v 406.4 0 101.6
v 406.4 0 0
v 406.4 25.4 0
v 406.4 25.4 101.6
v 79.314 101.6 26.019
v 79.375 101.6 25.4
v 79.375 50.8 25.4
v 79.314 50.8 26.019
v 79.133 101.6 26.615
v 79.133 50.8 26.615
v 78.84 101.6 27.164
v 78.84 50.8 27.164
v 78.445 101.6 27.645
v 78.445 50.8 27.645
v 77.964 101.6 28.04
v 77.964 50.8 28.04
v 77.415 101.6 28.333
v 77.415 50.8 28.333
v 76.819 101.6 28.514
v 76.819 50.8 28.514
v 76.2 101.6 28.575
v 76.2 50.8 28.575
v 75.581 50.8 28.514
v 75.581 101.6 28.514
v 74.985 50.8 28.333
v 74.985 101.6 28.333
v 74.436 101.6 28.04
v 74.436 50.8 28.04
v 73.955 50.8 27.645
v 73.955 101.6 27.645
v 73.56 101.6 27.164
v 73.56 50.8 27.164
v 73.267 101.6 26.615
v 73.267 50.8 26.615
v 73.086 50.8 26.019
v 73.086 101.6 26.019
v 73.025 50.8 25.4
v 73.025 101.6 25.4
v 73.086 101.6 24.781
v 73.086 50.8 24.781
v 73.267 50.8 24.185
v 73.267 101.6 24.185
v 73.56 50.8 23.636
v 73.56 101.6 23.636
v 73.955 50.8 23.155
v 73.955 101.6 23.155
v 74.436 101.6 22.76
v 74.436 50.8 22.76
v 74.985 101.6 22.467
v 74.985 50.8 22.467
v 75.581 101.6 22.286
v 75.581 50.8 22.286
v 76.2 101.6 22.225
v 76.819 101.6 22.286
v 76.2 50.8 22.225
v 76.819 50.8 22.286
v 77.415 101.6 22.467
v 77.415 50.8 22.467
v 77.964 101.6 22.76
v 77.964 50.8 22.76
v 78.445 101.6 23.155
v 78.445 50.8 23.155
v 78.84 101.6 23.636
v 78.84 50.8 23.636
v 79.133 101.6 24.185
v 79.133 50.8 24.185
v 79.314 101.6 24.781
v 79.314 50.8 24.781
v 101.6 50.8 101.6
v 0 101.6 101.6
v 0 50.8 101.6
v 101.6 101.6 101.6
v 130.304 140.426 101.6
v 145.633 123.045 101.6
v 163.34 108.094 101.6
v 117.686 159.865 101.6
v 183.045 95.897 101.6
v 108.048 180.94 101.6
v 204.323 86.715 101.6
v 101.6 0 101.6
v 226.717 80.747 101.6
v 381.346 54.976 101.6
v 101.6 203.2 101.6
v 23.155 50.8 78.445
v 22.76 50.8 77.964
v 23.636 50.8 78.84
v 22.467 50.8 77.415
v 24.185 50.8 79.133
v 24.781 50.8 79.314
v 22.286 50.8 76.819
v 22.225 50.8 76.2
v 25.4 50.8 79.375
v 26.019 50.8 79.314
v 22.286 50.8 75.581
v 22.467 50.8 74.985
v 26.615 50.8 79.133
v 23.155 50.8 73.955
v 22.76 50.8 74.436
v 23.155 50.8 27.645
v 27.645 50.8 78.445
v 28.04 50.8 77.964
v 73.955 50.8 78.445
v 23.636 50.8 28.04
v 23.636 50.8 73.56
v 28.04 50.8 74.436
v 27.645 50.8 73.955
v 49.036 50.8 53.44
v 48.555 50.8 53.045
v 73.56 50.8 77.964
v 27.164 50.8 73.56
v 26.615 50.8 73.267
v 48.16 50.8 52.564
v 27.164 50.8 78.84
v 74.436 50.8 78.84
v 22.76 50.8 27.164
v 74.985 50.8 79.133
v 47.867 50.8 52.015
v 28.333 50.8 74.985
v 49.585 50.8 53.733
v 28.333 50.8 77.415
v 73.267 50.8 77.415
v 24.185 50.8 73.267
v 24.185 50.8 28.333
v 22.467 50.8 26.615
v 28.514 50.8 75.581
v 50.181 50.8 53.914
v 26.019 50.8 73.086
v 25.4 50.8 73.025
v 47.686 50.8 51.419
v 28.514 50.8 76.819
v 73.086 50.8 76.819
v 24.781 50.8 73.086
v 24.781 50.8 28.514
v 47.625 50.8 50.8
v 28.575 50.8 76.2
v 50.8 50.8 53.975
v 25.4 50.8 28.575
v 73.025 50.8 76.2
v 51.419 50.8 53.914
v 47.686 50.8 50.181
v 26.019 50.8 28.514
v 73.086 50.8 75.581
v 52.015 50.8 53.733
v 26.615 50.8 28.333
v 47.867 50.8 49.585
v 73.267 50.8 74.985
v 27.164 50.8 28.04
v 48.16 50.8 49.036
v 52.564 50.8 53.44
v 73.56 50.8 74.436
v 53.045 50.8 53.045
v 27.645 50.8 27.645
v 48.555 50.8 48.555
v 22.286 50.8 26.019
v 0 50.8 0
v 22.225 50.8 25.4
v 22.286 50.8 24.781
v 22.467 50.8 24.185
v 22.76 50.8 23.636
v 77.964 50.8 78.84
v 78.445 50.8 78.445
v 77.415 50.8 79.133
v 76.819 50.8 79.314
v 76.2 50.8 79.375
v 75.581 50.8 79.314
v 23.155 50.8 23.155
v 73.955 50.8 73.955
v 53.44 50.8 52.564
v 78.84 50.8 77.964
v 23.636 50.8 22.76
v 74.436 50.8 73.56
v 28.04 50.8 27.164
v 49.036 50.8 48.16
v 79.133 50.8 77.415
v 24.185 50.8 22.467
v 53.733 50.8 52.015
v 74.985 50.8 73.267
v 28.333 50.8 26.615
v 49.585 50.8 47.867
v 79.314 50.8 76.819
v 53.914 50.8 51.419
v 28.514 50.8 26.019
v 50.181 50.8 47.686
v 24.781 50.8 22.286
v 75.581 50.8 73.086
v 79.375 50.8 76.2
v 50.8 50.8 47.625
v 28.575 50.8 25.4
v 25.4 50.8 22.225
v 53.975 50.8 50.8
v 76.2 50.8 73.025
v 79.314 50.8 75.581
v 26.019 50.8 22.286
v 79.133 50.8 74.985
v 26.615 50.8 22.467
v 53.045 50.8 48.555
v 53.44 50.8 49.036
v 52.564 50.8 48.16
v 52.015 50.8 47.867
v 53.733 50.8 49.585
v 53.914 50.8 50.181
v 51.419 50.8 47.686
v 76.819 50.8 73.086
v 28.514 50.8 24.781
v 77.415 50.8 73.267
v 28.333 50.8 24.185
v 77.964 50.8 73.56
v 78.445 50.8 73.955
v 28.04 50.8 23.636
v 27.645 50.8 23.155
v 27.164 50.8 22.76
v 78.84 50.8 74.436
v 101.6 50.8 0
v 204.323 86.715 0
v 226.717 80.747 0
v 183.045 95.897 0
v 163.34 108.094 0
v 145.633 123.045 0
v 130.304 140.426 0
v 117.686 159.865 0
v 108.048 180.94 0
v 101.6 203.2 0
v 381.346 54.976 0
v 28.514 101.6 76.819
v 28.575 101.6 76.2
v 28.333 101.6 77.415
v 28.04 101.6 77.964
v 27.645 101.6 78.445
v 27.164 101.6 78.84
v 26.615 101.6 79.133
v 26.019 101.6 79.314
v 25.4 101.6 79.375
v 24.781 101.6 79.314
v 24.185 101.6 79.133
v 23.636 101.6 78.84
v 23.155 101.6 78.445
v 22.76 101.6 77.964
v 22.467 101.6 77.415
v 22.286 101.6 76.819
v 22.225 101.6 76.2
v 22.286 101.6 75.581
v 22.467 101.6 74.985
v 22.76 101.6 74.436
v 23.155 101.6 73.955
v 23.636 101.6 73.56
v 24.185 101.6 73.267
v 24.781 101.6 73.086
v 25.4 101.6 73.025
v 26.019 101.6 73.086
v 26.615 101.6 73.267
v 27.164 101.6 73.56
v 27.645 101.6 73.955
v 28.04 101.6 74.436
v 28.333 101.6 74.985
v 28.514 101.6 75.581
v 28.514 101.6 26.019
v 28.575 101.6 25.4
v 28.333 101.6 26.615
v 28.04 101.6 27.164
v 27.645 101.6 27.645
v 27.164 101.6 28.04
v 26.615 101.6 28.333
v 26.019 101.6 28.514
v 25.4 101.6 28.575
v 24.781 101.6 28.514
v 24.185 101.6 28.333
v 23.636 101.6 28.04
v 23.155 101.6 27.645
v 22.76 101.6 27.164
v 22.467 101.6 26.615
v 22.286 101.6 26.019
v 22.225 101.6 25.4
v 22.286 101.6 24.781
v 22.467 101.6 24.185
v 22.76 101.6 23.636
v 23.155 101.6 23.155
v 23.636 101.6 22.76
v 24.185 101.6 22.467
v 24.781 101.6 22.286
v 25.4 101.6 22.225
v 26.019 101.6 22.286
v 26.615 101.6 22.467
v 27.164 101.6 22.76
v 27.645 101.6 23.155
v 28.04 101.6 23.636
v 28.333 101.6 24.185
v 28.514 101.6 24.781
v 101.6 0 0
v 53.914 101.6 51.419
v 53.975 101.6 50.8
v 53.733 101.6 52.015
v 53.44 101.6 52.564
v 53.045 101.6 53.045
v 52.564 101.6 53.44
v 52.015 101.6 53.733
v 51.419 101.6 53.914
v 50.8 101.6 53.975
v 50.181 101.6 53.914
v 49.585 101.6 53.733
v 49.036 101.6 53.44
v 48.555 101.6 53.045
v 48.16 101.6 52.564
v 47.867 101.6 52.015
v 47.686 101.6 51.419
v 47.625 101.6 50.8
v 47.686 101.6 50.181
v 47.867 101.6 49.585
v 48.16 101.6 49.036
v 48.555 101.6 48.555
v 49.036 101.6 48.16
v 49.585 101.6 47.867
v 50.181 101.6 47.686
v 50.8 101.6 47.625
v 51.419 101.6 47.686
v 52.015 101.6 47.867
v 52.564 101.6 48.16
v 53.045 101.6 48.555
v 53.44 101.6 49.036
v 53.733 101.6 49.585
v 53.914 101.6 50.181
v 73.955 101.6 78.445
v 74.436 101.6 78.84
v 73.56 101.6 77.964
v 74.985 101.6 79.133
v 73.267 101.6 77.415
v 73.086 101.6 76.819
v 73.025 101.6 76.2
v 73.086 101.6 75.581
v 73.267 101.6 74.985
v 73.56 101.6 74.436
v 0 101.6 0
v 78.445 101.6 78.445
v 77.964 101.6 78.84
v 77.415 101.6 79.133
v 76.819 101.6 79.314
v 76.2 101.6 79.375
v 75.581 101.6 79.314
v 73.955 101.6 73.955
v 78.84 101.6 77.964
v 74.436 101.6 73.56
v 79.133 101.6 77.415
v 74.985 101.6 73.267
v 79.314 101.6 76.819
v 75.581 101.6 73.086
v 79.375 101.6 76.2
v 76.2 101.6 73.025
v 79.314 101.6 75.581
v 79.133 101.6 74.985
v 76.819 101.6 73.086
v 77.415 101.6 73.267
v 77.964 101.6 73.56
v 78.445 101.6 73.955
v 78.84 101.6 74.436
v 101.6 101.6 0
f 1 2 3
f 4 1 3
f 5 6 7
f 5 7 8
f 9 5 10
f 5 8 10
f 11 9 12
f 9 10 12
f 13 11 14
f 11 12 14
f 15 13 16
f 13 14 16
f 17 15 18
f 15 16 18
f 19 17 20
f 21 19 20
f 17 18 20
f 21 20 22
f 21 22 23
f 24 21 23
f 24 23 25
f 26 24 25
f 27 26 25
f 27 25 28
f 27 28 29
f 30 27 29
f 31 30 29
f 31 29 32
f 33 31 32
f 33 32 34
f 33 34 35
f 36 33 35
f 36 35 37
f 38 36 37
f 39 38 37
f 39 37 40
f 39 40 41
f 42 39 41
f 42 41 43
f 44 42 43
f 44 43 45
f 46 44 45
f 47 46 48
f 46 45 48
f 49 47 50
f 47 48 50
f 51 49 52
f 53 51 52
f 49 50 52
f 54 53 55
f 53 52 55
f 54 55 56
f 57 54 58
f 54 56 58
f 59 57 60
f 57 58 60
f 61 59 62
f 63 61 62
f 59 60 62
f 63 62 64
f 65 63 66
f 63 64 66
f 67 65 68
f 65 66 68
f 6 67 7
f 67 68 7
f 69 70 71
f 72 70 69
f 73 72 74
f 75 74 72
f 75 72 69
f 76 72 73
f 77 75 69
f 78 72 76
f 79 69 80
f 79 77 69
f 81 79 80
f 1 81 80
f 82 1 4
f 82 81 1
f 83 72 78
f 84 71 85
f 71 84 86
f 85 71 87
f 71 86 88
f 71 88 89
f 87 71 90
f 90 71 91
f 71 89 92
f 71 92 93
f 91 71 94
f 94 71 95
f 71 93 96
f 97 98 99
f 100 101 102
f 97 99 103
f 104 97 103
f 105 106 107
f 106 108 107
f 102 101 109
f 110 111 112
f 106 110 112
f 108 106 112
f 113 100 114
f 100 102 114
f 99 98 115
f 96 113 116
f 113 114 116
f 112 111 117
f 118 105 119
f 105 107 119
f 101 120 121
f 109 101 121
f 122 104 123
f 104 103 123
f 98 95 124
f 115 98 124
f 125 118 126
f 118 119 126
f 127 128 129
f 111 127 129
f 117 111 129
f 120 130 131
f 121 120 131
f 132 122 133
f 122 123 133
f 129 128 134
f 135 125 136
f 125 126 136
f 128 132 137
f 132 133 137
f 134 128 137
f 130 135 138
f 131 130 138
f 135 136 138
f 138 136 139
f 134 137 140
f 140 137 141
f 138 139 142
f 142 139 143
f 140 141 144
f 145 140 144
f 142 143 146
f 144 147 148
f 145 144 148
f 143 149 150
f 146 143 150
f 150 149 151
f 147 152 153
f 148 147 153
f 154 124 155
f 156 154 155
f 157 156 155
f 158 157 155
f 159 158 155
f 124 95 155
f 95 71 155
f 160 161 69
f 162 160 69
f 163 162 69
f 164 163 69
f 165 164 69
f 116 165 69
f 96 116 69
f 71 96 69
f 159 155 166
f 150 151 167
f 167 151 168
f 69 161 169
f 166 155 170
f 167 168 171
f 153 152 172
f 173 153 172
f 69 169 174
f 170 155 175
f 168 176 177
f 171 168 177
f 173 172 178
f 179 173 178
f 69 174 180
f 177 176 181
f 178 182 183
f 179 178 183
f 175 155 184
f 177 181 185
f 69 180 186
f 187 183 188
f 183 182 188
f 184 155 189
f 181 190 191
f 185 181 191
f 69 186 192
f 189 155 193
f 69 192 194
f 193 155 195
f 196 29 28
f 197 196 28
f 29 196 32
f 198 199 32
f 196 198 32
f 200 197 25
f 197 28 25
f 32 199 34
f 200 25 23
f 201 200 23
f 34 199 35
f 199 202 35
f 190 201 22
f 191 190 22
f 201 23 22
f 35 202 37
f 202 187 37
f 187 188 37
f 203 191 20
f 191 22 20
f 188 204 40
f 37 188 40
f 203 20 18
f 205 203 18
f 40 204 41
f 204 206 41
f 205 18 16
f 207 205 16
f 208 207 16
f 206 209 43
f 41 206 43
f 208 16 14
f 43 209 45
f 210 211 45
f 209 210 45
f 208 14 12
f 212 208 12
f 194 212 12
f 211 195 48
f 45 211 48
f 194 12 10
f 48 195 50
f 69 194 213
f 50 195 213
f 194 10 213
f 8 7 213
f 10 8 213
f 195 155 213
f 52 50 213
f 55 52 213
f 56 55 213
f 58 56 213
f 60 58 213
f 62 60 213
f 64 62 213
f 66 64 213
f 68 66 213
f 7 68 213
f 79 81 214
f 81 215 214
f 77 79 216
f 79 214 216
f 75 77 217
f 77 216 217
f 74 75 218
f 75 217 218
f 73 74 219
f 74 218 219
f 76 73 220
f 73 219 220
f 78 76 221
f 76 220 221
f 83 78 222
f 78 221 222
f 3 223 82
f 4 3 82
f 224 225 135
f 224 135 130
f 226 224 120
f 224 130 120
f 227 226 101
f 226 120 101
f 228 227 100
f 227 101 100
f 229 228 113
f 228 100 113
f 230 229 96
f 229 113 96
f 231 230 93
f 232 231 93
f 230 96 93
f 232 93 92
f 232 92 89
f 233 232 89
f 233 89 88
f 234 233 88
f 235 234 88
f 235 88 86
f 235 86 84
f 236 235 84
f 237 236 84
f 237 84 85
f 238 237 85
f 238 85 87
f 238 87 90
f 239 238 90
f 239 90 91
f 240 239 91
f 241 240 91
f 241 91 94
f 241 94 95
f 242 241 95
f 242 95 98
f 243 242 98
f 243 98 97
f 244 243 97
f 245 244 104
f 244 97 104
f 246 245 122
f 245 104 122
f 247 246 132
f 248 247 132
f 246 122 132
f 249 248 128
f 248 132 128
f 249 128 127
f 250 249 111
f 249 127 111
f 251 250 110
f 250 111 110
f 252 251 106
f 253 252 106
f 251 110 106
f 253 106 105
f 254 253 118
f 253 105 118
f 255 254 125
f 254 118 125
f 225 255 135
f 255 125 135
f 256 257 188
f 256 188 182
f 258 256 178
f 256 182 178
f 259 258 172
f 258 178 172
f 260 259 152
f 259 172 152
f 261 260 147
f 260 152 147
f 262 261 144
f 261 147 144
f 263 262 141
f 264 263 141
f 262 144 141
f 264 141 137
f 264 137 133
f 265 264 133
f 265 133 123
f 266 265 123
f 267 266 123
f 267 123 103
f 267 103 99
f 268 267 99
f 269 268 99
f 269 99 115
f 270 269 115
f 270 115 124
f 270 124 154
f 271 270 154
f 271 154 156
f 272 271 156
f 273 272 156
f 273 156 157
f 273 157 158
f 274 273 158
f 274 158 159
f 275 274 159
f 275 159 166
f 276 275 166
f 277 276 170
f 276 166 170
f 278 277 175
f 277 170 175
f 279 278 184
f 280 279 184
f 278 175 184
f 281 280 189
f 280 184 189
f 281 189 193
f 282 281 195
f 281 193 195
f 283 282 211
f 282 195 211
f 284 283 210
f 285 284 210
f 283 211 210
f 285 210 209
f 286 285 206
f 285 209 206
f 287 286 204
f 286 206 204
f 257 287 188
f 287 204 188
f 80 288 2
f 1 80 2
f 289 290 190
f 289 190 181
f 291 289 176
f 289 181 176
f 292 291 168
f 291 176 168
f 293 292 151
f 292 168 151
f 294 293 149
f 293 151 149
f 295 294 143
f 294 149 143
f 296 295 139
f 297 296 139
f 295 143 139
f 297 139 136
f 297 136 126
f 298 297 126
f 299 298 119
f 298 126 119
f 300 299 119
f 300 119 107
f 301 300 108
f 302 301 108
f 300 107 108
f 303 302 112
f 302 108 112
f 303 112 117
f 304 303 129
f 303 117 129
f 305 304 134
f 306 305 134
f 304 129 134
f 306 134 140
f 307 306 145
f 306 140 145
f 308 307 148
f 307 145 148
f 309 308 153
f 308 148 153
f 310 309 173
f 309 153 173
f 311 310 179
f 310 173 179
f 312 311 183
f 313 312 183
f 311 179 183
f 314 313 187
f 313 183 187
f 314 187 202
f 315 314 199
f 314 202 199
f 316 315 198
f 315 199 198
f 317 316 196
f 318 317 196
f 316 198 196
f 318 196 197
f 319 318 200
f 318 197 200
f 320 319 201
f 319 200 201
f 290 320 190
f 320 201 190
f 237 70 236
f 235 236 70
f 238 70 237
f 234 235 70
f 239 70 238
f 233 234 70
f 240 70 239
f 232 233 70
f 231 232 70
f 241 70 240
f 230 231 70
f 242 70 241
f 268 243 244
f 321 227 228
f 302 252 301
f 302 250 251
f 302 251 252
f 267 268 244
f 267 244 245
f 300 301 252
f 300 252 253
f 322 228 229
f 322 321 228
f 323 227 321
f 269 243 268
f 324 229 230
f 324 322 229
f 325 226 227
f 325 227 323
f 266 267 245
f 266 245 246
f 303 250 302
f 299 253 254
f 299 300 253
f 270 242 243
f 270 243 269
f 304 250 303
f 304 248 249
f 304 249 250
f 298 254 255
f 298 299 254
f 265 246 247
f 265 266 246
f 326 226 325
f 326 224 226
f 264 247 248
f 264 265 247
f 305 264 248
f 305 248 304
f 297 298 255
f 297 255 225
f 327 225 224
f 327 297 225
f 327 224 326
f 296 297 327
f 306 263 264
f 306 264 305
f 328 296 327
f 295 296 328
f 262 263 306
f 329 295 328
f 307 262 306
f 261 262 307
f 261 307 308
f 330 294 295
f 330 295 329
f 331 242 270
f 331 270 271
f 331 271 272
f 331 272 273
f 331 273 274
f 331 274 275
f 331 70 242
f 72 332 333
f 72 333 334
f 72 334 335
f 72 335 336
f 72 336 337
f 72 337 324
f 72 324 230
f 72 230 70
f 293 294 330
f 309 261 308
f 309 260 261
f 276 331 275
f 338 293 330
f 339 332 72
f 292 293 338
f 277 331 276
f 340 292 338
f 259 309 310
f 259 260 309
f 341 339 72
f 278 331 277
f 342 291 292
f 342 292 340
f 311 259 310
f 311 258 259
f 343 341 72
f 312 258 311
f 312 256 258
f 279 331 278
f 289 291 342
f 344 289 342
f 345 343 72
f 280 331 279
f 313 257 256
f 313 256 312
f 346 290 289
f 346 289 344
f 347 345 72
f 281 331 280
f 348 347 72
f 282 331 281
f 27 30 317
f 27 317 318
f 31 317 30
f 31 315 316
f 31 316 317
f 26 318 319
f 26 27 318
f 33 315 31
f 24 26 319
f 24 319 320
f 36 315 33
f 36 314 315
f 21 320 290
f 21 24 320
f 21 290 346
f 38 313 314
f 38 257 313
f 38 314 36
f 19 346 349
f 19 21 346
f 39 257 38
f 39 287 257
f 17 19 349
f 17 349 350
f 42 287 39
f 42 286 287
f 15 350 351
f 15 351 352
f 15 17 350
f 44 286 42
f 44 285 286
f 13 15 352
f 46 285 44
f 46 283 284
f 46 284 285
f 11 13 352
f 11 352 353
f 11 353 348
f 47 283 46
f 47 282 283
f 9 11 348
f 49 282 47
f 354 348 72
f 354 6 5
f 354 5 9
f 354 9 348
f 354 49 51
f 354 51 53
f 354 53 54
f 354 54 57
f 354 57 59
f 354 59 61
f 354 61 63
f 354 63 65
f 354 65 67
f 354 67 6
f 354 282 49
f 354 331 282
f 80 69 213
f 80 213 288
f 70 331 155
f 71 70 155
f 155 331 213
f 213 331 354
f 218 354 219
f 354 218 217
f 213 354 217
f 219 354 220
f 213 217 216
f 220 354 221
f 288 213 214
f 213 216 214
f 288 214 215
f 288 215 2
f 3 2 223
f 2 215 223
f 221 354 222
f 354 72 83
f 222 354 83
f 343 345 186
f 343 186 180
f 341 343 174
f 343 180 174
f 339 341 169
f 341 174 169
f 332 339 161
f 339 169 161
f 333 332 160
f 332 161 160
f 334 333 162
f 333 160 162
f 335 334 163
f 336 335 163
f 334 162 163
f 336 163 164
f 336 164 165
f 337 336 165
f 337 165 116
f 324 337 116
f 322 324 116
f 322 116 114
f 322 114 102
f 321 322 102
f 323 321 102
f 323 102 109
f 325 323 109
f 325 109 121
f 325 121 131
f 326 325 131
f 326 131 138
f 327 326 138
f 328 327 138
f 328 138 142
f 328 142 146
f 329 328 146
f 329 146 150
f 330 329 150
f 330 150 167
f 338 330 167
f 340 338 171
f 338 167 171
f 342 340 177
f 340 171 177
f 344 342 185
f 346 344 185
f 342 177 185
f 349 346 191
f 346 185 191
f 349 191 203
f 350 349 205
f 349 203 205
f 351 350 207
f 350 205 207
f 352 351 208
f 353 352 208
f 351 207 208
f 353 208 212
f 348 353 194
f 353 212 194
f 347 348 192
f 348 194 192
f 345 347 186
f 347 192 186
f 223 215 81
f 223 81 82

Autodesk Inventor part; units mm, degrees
ref_plane "YZ Plane" through (0, 0, 0) normal (1, 0, 0) x (0, 1, 0)
ref_plane "XZ Plane" through (0, 0, 0) normal (0, 1, 0) x (-1, 0, 0)
ref_plane "XY Plane" through (0, 0, 0) normal (0, 0, 1) x (1, 0, 0)
sketch "Sketch1" plane through (0, 0, 0) normal (0, 0, 1) x (1, 0, 0)
  line L0 (0, 0) -> (406.4, 0)
  line L1 (406.4, 0) -> (406.4, 203.2)
  line L2 (406.4, 203.2) -> (0, 203.2)
  line L3 (0, 203.2) -> (0, 0)
  line L4 (0, 101.6) -> (664.7751, 101.6)
  line L5 (101.6, 101.6) -> (406.4, 50.8)
  line L6 (0, 50.8) -> (101.6, 50.8)
  line L7 (101.6, 50.8) -> (101.6, 0)
  line L8 (101.6, 101.6) -> (101.6, 203.2)
  arc A0 (101.6, 203.2) -> (233.5206, 79.6132) centre (256.07, 235.8848) ccw
  point P0 (226.7178, 80.747)
  dimension "d0" = 406.4
  dimension "d1" = 203.2
  dimension "d2" = 101.6
  dimension "d3" = 50.8
  dimension "d26" = 101.6
extrude "Extrusion1" add sketch "Sketch1" along normal blind 101.6 contours L7 L6 L3 L4 L5 A0 L1 L0 | L8 A0 L4 | L4 A0 L5 | A0 L5
chamfer "Chamfer1" distance 25.4 angle 45 1 edges at (406.4, 50.8, 50.8)
sketch "Sketch2" plane through (0, 50.8, 0) normal (0, -1, 0) x (1, 0, 0)
  circle A0 centre (25.4, 76.2) radius 3.175
  circle A1 centre (76.2, 76.2) radius 3.175
  circle A2 centre (76.2, 25.4) radius 3.175
  circle A3 centre (50.8, 50.8) radius 3.175
  circle A4 centre (25.4, 25.4) radius 3.175
  line L0 (0, 101.6) -> (101.6, 101.6) projected
  line L1 (0, 0) -> (0, 101.6) projected
  line L2 (101.6, 0) -> (101.6, 101.6) projected
  line L3 (0, 0) -> (101.6, 0) projected
  dimension "d9" = 6.35
  dimension "d10" = 6.35
  dimension "d11" = 6.35
  dimension "d12" = 6.35
  dimension "d13" = 6.35
  dimension "d14" = 25.4
  dimension "d15" = 25.4
  dimension "d16" = 25.4
  dimension "d17" = 25.4
  dimension "d18" = 25.4
  dimension "d19" = 25.4
  dimension "d20" = 25.4
  dimension "d21" = 25.4
  dimension "d22" = 50.8
  dimension "d23" = 50.8
extrude "Extrusion2" cut sketch "Sketch2" against normal blind 101.6 contours A0 | A1 | A2 | A3 | A4
properties part number "Table foot X4"
